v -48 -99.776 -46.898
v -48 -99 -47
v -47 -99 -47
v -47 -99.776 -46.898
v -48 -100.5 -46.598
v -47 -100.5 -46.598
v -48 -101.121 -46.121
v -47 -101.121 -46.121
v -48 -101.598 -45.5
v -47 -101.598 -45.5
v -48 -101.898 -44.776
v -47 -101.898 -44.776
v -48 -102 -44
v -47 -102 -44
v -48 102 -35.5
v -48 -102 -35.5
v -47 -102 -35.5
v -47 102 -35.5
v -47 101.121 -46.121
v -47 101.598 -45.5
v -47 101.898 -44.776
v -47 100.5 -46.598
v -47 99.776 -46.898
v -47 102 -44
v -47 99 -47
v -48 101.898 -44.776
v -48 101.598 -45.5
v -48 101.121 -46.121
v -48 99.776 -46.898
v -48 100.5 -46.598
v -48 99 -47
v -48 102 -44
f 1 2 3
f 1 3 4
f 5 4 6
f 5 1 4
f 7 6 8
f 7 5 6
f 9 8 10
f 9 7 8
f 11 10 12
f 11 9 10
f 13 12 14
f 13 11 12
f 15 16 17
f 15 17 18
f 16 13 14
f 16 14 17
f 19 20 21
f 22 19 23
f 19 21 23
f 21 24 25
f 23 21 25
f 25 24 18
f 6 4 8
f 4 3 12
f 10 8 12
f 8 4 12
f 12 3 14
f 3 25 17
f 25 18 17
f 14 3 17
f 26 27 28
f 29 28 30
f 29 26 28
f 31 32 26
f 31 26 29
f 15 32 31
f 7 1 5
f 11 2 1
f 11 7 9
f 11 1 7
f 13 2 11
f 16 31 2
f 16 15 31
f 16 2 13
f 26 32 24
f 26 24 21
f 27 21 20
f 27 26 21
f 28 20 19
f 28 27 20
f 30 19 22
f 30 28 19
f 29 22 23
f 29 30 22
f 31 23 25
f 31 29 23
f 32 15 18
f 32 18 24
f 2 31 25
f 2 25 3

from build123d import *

# Parameters (mm, degrees)
BOSS_EXTRUDE1_DEPTH = 1


with BuildPart() as part:
    # Sketch1 → Boss-Extrude1 (new body)
    with BuildSketch(Plane(origin=(-48, 0, 0), x_dir=(0, -1, 0), z_dir=(-1, 0, 0))):
        with BuildLine():
            Line((-99, -47), (99, -47))
            ThreePointArc((99, -47), (101.121320344, -46.121320344), (102, -44))
            Line((102, -44), (102, -35.5))
            Line((102, -35.5), (-102, -35.5))
            Line((-102, -35.5), (-102, -44))
            ThreePointArc((-102, -44), (-101.121320344, -46.121320344), (-99, -47))
        make_face()
    extrude(amount=-BOSS_EXTRUDE1_DEPTH)


solid = part.part
